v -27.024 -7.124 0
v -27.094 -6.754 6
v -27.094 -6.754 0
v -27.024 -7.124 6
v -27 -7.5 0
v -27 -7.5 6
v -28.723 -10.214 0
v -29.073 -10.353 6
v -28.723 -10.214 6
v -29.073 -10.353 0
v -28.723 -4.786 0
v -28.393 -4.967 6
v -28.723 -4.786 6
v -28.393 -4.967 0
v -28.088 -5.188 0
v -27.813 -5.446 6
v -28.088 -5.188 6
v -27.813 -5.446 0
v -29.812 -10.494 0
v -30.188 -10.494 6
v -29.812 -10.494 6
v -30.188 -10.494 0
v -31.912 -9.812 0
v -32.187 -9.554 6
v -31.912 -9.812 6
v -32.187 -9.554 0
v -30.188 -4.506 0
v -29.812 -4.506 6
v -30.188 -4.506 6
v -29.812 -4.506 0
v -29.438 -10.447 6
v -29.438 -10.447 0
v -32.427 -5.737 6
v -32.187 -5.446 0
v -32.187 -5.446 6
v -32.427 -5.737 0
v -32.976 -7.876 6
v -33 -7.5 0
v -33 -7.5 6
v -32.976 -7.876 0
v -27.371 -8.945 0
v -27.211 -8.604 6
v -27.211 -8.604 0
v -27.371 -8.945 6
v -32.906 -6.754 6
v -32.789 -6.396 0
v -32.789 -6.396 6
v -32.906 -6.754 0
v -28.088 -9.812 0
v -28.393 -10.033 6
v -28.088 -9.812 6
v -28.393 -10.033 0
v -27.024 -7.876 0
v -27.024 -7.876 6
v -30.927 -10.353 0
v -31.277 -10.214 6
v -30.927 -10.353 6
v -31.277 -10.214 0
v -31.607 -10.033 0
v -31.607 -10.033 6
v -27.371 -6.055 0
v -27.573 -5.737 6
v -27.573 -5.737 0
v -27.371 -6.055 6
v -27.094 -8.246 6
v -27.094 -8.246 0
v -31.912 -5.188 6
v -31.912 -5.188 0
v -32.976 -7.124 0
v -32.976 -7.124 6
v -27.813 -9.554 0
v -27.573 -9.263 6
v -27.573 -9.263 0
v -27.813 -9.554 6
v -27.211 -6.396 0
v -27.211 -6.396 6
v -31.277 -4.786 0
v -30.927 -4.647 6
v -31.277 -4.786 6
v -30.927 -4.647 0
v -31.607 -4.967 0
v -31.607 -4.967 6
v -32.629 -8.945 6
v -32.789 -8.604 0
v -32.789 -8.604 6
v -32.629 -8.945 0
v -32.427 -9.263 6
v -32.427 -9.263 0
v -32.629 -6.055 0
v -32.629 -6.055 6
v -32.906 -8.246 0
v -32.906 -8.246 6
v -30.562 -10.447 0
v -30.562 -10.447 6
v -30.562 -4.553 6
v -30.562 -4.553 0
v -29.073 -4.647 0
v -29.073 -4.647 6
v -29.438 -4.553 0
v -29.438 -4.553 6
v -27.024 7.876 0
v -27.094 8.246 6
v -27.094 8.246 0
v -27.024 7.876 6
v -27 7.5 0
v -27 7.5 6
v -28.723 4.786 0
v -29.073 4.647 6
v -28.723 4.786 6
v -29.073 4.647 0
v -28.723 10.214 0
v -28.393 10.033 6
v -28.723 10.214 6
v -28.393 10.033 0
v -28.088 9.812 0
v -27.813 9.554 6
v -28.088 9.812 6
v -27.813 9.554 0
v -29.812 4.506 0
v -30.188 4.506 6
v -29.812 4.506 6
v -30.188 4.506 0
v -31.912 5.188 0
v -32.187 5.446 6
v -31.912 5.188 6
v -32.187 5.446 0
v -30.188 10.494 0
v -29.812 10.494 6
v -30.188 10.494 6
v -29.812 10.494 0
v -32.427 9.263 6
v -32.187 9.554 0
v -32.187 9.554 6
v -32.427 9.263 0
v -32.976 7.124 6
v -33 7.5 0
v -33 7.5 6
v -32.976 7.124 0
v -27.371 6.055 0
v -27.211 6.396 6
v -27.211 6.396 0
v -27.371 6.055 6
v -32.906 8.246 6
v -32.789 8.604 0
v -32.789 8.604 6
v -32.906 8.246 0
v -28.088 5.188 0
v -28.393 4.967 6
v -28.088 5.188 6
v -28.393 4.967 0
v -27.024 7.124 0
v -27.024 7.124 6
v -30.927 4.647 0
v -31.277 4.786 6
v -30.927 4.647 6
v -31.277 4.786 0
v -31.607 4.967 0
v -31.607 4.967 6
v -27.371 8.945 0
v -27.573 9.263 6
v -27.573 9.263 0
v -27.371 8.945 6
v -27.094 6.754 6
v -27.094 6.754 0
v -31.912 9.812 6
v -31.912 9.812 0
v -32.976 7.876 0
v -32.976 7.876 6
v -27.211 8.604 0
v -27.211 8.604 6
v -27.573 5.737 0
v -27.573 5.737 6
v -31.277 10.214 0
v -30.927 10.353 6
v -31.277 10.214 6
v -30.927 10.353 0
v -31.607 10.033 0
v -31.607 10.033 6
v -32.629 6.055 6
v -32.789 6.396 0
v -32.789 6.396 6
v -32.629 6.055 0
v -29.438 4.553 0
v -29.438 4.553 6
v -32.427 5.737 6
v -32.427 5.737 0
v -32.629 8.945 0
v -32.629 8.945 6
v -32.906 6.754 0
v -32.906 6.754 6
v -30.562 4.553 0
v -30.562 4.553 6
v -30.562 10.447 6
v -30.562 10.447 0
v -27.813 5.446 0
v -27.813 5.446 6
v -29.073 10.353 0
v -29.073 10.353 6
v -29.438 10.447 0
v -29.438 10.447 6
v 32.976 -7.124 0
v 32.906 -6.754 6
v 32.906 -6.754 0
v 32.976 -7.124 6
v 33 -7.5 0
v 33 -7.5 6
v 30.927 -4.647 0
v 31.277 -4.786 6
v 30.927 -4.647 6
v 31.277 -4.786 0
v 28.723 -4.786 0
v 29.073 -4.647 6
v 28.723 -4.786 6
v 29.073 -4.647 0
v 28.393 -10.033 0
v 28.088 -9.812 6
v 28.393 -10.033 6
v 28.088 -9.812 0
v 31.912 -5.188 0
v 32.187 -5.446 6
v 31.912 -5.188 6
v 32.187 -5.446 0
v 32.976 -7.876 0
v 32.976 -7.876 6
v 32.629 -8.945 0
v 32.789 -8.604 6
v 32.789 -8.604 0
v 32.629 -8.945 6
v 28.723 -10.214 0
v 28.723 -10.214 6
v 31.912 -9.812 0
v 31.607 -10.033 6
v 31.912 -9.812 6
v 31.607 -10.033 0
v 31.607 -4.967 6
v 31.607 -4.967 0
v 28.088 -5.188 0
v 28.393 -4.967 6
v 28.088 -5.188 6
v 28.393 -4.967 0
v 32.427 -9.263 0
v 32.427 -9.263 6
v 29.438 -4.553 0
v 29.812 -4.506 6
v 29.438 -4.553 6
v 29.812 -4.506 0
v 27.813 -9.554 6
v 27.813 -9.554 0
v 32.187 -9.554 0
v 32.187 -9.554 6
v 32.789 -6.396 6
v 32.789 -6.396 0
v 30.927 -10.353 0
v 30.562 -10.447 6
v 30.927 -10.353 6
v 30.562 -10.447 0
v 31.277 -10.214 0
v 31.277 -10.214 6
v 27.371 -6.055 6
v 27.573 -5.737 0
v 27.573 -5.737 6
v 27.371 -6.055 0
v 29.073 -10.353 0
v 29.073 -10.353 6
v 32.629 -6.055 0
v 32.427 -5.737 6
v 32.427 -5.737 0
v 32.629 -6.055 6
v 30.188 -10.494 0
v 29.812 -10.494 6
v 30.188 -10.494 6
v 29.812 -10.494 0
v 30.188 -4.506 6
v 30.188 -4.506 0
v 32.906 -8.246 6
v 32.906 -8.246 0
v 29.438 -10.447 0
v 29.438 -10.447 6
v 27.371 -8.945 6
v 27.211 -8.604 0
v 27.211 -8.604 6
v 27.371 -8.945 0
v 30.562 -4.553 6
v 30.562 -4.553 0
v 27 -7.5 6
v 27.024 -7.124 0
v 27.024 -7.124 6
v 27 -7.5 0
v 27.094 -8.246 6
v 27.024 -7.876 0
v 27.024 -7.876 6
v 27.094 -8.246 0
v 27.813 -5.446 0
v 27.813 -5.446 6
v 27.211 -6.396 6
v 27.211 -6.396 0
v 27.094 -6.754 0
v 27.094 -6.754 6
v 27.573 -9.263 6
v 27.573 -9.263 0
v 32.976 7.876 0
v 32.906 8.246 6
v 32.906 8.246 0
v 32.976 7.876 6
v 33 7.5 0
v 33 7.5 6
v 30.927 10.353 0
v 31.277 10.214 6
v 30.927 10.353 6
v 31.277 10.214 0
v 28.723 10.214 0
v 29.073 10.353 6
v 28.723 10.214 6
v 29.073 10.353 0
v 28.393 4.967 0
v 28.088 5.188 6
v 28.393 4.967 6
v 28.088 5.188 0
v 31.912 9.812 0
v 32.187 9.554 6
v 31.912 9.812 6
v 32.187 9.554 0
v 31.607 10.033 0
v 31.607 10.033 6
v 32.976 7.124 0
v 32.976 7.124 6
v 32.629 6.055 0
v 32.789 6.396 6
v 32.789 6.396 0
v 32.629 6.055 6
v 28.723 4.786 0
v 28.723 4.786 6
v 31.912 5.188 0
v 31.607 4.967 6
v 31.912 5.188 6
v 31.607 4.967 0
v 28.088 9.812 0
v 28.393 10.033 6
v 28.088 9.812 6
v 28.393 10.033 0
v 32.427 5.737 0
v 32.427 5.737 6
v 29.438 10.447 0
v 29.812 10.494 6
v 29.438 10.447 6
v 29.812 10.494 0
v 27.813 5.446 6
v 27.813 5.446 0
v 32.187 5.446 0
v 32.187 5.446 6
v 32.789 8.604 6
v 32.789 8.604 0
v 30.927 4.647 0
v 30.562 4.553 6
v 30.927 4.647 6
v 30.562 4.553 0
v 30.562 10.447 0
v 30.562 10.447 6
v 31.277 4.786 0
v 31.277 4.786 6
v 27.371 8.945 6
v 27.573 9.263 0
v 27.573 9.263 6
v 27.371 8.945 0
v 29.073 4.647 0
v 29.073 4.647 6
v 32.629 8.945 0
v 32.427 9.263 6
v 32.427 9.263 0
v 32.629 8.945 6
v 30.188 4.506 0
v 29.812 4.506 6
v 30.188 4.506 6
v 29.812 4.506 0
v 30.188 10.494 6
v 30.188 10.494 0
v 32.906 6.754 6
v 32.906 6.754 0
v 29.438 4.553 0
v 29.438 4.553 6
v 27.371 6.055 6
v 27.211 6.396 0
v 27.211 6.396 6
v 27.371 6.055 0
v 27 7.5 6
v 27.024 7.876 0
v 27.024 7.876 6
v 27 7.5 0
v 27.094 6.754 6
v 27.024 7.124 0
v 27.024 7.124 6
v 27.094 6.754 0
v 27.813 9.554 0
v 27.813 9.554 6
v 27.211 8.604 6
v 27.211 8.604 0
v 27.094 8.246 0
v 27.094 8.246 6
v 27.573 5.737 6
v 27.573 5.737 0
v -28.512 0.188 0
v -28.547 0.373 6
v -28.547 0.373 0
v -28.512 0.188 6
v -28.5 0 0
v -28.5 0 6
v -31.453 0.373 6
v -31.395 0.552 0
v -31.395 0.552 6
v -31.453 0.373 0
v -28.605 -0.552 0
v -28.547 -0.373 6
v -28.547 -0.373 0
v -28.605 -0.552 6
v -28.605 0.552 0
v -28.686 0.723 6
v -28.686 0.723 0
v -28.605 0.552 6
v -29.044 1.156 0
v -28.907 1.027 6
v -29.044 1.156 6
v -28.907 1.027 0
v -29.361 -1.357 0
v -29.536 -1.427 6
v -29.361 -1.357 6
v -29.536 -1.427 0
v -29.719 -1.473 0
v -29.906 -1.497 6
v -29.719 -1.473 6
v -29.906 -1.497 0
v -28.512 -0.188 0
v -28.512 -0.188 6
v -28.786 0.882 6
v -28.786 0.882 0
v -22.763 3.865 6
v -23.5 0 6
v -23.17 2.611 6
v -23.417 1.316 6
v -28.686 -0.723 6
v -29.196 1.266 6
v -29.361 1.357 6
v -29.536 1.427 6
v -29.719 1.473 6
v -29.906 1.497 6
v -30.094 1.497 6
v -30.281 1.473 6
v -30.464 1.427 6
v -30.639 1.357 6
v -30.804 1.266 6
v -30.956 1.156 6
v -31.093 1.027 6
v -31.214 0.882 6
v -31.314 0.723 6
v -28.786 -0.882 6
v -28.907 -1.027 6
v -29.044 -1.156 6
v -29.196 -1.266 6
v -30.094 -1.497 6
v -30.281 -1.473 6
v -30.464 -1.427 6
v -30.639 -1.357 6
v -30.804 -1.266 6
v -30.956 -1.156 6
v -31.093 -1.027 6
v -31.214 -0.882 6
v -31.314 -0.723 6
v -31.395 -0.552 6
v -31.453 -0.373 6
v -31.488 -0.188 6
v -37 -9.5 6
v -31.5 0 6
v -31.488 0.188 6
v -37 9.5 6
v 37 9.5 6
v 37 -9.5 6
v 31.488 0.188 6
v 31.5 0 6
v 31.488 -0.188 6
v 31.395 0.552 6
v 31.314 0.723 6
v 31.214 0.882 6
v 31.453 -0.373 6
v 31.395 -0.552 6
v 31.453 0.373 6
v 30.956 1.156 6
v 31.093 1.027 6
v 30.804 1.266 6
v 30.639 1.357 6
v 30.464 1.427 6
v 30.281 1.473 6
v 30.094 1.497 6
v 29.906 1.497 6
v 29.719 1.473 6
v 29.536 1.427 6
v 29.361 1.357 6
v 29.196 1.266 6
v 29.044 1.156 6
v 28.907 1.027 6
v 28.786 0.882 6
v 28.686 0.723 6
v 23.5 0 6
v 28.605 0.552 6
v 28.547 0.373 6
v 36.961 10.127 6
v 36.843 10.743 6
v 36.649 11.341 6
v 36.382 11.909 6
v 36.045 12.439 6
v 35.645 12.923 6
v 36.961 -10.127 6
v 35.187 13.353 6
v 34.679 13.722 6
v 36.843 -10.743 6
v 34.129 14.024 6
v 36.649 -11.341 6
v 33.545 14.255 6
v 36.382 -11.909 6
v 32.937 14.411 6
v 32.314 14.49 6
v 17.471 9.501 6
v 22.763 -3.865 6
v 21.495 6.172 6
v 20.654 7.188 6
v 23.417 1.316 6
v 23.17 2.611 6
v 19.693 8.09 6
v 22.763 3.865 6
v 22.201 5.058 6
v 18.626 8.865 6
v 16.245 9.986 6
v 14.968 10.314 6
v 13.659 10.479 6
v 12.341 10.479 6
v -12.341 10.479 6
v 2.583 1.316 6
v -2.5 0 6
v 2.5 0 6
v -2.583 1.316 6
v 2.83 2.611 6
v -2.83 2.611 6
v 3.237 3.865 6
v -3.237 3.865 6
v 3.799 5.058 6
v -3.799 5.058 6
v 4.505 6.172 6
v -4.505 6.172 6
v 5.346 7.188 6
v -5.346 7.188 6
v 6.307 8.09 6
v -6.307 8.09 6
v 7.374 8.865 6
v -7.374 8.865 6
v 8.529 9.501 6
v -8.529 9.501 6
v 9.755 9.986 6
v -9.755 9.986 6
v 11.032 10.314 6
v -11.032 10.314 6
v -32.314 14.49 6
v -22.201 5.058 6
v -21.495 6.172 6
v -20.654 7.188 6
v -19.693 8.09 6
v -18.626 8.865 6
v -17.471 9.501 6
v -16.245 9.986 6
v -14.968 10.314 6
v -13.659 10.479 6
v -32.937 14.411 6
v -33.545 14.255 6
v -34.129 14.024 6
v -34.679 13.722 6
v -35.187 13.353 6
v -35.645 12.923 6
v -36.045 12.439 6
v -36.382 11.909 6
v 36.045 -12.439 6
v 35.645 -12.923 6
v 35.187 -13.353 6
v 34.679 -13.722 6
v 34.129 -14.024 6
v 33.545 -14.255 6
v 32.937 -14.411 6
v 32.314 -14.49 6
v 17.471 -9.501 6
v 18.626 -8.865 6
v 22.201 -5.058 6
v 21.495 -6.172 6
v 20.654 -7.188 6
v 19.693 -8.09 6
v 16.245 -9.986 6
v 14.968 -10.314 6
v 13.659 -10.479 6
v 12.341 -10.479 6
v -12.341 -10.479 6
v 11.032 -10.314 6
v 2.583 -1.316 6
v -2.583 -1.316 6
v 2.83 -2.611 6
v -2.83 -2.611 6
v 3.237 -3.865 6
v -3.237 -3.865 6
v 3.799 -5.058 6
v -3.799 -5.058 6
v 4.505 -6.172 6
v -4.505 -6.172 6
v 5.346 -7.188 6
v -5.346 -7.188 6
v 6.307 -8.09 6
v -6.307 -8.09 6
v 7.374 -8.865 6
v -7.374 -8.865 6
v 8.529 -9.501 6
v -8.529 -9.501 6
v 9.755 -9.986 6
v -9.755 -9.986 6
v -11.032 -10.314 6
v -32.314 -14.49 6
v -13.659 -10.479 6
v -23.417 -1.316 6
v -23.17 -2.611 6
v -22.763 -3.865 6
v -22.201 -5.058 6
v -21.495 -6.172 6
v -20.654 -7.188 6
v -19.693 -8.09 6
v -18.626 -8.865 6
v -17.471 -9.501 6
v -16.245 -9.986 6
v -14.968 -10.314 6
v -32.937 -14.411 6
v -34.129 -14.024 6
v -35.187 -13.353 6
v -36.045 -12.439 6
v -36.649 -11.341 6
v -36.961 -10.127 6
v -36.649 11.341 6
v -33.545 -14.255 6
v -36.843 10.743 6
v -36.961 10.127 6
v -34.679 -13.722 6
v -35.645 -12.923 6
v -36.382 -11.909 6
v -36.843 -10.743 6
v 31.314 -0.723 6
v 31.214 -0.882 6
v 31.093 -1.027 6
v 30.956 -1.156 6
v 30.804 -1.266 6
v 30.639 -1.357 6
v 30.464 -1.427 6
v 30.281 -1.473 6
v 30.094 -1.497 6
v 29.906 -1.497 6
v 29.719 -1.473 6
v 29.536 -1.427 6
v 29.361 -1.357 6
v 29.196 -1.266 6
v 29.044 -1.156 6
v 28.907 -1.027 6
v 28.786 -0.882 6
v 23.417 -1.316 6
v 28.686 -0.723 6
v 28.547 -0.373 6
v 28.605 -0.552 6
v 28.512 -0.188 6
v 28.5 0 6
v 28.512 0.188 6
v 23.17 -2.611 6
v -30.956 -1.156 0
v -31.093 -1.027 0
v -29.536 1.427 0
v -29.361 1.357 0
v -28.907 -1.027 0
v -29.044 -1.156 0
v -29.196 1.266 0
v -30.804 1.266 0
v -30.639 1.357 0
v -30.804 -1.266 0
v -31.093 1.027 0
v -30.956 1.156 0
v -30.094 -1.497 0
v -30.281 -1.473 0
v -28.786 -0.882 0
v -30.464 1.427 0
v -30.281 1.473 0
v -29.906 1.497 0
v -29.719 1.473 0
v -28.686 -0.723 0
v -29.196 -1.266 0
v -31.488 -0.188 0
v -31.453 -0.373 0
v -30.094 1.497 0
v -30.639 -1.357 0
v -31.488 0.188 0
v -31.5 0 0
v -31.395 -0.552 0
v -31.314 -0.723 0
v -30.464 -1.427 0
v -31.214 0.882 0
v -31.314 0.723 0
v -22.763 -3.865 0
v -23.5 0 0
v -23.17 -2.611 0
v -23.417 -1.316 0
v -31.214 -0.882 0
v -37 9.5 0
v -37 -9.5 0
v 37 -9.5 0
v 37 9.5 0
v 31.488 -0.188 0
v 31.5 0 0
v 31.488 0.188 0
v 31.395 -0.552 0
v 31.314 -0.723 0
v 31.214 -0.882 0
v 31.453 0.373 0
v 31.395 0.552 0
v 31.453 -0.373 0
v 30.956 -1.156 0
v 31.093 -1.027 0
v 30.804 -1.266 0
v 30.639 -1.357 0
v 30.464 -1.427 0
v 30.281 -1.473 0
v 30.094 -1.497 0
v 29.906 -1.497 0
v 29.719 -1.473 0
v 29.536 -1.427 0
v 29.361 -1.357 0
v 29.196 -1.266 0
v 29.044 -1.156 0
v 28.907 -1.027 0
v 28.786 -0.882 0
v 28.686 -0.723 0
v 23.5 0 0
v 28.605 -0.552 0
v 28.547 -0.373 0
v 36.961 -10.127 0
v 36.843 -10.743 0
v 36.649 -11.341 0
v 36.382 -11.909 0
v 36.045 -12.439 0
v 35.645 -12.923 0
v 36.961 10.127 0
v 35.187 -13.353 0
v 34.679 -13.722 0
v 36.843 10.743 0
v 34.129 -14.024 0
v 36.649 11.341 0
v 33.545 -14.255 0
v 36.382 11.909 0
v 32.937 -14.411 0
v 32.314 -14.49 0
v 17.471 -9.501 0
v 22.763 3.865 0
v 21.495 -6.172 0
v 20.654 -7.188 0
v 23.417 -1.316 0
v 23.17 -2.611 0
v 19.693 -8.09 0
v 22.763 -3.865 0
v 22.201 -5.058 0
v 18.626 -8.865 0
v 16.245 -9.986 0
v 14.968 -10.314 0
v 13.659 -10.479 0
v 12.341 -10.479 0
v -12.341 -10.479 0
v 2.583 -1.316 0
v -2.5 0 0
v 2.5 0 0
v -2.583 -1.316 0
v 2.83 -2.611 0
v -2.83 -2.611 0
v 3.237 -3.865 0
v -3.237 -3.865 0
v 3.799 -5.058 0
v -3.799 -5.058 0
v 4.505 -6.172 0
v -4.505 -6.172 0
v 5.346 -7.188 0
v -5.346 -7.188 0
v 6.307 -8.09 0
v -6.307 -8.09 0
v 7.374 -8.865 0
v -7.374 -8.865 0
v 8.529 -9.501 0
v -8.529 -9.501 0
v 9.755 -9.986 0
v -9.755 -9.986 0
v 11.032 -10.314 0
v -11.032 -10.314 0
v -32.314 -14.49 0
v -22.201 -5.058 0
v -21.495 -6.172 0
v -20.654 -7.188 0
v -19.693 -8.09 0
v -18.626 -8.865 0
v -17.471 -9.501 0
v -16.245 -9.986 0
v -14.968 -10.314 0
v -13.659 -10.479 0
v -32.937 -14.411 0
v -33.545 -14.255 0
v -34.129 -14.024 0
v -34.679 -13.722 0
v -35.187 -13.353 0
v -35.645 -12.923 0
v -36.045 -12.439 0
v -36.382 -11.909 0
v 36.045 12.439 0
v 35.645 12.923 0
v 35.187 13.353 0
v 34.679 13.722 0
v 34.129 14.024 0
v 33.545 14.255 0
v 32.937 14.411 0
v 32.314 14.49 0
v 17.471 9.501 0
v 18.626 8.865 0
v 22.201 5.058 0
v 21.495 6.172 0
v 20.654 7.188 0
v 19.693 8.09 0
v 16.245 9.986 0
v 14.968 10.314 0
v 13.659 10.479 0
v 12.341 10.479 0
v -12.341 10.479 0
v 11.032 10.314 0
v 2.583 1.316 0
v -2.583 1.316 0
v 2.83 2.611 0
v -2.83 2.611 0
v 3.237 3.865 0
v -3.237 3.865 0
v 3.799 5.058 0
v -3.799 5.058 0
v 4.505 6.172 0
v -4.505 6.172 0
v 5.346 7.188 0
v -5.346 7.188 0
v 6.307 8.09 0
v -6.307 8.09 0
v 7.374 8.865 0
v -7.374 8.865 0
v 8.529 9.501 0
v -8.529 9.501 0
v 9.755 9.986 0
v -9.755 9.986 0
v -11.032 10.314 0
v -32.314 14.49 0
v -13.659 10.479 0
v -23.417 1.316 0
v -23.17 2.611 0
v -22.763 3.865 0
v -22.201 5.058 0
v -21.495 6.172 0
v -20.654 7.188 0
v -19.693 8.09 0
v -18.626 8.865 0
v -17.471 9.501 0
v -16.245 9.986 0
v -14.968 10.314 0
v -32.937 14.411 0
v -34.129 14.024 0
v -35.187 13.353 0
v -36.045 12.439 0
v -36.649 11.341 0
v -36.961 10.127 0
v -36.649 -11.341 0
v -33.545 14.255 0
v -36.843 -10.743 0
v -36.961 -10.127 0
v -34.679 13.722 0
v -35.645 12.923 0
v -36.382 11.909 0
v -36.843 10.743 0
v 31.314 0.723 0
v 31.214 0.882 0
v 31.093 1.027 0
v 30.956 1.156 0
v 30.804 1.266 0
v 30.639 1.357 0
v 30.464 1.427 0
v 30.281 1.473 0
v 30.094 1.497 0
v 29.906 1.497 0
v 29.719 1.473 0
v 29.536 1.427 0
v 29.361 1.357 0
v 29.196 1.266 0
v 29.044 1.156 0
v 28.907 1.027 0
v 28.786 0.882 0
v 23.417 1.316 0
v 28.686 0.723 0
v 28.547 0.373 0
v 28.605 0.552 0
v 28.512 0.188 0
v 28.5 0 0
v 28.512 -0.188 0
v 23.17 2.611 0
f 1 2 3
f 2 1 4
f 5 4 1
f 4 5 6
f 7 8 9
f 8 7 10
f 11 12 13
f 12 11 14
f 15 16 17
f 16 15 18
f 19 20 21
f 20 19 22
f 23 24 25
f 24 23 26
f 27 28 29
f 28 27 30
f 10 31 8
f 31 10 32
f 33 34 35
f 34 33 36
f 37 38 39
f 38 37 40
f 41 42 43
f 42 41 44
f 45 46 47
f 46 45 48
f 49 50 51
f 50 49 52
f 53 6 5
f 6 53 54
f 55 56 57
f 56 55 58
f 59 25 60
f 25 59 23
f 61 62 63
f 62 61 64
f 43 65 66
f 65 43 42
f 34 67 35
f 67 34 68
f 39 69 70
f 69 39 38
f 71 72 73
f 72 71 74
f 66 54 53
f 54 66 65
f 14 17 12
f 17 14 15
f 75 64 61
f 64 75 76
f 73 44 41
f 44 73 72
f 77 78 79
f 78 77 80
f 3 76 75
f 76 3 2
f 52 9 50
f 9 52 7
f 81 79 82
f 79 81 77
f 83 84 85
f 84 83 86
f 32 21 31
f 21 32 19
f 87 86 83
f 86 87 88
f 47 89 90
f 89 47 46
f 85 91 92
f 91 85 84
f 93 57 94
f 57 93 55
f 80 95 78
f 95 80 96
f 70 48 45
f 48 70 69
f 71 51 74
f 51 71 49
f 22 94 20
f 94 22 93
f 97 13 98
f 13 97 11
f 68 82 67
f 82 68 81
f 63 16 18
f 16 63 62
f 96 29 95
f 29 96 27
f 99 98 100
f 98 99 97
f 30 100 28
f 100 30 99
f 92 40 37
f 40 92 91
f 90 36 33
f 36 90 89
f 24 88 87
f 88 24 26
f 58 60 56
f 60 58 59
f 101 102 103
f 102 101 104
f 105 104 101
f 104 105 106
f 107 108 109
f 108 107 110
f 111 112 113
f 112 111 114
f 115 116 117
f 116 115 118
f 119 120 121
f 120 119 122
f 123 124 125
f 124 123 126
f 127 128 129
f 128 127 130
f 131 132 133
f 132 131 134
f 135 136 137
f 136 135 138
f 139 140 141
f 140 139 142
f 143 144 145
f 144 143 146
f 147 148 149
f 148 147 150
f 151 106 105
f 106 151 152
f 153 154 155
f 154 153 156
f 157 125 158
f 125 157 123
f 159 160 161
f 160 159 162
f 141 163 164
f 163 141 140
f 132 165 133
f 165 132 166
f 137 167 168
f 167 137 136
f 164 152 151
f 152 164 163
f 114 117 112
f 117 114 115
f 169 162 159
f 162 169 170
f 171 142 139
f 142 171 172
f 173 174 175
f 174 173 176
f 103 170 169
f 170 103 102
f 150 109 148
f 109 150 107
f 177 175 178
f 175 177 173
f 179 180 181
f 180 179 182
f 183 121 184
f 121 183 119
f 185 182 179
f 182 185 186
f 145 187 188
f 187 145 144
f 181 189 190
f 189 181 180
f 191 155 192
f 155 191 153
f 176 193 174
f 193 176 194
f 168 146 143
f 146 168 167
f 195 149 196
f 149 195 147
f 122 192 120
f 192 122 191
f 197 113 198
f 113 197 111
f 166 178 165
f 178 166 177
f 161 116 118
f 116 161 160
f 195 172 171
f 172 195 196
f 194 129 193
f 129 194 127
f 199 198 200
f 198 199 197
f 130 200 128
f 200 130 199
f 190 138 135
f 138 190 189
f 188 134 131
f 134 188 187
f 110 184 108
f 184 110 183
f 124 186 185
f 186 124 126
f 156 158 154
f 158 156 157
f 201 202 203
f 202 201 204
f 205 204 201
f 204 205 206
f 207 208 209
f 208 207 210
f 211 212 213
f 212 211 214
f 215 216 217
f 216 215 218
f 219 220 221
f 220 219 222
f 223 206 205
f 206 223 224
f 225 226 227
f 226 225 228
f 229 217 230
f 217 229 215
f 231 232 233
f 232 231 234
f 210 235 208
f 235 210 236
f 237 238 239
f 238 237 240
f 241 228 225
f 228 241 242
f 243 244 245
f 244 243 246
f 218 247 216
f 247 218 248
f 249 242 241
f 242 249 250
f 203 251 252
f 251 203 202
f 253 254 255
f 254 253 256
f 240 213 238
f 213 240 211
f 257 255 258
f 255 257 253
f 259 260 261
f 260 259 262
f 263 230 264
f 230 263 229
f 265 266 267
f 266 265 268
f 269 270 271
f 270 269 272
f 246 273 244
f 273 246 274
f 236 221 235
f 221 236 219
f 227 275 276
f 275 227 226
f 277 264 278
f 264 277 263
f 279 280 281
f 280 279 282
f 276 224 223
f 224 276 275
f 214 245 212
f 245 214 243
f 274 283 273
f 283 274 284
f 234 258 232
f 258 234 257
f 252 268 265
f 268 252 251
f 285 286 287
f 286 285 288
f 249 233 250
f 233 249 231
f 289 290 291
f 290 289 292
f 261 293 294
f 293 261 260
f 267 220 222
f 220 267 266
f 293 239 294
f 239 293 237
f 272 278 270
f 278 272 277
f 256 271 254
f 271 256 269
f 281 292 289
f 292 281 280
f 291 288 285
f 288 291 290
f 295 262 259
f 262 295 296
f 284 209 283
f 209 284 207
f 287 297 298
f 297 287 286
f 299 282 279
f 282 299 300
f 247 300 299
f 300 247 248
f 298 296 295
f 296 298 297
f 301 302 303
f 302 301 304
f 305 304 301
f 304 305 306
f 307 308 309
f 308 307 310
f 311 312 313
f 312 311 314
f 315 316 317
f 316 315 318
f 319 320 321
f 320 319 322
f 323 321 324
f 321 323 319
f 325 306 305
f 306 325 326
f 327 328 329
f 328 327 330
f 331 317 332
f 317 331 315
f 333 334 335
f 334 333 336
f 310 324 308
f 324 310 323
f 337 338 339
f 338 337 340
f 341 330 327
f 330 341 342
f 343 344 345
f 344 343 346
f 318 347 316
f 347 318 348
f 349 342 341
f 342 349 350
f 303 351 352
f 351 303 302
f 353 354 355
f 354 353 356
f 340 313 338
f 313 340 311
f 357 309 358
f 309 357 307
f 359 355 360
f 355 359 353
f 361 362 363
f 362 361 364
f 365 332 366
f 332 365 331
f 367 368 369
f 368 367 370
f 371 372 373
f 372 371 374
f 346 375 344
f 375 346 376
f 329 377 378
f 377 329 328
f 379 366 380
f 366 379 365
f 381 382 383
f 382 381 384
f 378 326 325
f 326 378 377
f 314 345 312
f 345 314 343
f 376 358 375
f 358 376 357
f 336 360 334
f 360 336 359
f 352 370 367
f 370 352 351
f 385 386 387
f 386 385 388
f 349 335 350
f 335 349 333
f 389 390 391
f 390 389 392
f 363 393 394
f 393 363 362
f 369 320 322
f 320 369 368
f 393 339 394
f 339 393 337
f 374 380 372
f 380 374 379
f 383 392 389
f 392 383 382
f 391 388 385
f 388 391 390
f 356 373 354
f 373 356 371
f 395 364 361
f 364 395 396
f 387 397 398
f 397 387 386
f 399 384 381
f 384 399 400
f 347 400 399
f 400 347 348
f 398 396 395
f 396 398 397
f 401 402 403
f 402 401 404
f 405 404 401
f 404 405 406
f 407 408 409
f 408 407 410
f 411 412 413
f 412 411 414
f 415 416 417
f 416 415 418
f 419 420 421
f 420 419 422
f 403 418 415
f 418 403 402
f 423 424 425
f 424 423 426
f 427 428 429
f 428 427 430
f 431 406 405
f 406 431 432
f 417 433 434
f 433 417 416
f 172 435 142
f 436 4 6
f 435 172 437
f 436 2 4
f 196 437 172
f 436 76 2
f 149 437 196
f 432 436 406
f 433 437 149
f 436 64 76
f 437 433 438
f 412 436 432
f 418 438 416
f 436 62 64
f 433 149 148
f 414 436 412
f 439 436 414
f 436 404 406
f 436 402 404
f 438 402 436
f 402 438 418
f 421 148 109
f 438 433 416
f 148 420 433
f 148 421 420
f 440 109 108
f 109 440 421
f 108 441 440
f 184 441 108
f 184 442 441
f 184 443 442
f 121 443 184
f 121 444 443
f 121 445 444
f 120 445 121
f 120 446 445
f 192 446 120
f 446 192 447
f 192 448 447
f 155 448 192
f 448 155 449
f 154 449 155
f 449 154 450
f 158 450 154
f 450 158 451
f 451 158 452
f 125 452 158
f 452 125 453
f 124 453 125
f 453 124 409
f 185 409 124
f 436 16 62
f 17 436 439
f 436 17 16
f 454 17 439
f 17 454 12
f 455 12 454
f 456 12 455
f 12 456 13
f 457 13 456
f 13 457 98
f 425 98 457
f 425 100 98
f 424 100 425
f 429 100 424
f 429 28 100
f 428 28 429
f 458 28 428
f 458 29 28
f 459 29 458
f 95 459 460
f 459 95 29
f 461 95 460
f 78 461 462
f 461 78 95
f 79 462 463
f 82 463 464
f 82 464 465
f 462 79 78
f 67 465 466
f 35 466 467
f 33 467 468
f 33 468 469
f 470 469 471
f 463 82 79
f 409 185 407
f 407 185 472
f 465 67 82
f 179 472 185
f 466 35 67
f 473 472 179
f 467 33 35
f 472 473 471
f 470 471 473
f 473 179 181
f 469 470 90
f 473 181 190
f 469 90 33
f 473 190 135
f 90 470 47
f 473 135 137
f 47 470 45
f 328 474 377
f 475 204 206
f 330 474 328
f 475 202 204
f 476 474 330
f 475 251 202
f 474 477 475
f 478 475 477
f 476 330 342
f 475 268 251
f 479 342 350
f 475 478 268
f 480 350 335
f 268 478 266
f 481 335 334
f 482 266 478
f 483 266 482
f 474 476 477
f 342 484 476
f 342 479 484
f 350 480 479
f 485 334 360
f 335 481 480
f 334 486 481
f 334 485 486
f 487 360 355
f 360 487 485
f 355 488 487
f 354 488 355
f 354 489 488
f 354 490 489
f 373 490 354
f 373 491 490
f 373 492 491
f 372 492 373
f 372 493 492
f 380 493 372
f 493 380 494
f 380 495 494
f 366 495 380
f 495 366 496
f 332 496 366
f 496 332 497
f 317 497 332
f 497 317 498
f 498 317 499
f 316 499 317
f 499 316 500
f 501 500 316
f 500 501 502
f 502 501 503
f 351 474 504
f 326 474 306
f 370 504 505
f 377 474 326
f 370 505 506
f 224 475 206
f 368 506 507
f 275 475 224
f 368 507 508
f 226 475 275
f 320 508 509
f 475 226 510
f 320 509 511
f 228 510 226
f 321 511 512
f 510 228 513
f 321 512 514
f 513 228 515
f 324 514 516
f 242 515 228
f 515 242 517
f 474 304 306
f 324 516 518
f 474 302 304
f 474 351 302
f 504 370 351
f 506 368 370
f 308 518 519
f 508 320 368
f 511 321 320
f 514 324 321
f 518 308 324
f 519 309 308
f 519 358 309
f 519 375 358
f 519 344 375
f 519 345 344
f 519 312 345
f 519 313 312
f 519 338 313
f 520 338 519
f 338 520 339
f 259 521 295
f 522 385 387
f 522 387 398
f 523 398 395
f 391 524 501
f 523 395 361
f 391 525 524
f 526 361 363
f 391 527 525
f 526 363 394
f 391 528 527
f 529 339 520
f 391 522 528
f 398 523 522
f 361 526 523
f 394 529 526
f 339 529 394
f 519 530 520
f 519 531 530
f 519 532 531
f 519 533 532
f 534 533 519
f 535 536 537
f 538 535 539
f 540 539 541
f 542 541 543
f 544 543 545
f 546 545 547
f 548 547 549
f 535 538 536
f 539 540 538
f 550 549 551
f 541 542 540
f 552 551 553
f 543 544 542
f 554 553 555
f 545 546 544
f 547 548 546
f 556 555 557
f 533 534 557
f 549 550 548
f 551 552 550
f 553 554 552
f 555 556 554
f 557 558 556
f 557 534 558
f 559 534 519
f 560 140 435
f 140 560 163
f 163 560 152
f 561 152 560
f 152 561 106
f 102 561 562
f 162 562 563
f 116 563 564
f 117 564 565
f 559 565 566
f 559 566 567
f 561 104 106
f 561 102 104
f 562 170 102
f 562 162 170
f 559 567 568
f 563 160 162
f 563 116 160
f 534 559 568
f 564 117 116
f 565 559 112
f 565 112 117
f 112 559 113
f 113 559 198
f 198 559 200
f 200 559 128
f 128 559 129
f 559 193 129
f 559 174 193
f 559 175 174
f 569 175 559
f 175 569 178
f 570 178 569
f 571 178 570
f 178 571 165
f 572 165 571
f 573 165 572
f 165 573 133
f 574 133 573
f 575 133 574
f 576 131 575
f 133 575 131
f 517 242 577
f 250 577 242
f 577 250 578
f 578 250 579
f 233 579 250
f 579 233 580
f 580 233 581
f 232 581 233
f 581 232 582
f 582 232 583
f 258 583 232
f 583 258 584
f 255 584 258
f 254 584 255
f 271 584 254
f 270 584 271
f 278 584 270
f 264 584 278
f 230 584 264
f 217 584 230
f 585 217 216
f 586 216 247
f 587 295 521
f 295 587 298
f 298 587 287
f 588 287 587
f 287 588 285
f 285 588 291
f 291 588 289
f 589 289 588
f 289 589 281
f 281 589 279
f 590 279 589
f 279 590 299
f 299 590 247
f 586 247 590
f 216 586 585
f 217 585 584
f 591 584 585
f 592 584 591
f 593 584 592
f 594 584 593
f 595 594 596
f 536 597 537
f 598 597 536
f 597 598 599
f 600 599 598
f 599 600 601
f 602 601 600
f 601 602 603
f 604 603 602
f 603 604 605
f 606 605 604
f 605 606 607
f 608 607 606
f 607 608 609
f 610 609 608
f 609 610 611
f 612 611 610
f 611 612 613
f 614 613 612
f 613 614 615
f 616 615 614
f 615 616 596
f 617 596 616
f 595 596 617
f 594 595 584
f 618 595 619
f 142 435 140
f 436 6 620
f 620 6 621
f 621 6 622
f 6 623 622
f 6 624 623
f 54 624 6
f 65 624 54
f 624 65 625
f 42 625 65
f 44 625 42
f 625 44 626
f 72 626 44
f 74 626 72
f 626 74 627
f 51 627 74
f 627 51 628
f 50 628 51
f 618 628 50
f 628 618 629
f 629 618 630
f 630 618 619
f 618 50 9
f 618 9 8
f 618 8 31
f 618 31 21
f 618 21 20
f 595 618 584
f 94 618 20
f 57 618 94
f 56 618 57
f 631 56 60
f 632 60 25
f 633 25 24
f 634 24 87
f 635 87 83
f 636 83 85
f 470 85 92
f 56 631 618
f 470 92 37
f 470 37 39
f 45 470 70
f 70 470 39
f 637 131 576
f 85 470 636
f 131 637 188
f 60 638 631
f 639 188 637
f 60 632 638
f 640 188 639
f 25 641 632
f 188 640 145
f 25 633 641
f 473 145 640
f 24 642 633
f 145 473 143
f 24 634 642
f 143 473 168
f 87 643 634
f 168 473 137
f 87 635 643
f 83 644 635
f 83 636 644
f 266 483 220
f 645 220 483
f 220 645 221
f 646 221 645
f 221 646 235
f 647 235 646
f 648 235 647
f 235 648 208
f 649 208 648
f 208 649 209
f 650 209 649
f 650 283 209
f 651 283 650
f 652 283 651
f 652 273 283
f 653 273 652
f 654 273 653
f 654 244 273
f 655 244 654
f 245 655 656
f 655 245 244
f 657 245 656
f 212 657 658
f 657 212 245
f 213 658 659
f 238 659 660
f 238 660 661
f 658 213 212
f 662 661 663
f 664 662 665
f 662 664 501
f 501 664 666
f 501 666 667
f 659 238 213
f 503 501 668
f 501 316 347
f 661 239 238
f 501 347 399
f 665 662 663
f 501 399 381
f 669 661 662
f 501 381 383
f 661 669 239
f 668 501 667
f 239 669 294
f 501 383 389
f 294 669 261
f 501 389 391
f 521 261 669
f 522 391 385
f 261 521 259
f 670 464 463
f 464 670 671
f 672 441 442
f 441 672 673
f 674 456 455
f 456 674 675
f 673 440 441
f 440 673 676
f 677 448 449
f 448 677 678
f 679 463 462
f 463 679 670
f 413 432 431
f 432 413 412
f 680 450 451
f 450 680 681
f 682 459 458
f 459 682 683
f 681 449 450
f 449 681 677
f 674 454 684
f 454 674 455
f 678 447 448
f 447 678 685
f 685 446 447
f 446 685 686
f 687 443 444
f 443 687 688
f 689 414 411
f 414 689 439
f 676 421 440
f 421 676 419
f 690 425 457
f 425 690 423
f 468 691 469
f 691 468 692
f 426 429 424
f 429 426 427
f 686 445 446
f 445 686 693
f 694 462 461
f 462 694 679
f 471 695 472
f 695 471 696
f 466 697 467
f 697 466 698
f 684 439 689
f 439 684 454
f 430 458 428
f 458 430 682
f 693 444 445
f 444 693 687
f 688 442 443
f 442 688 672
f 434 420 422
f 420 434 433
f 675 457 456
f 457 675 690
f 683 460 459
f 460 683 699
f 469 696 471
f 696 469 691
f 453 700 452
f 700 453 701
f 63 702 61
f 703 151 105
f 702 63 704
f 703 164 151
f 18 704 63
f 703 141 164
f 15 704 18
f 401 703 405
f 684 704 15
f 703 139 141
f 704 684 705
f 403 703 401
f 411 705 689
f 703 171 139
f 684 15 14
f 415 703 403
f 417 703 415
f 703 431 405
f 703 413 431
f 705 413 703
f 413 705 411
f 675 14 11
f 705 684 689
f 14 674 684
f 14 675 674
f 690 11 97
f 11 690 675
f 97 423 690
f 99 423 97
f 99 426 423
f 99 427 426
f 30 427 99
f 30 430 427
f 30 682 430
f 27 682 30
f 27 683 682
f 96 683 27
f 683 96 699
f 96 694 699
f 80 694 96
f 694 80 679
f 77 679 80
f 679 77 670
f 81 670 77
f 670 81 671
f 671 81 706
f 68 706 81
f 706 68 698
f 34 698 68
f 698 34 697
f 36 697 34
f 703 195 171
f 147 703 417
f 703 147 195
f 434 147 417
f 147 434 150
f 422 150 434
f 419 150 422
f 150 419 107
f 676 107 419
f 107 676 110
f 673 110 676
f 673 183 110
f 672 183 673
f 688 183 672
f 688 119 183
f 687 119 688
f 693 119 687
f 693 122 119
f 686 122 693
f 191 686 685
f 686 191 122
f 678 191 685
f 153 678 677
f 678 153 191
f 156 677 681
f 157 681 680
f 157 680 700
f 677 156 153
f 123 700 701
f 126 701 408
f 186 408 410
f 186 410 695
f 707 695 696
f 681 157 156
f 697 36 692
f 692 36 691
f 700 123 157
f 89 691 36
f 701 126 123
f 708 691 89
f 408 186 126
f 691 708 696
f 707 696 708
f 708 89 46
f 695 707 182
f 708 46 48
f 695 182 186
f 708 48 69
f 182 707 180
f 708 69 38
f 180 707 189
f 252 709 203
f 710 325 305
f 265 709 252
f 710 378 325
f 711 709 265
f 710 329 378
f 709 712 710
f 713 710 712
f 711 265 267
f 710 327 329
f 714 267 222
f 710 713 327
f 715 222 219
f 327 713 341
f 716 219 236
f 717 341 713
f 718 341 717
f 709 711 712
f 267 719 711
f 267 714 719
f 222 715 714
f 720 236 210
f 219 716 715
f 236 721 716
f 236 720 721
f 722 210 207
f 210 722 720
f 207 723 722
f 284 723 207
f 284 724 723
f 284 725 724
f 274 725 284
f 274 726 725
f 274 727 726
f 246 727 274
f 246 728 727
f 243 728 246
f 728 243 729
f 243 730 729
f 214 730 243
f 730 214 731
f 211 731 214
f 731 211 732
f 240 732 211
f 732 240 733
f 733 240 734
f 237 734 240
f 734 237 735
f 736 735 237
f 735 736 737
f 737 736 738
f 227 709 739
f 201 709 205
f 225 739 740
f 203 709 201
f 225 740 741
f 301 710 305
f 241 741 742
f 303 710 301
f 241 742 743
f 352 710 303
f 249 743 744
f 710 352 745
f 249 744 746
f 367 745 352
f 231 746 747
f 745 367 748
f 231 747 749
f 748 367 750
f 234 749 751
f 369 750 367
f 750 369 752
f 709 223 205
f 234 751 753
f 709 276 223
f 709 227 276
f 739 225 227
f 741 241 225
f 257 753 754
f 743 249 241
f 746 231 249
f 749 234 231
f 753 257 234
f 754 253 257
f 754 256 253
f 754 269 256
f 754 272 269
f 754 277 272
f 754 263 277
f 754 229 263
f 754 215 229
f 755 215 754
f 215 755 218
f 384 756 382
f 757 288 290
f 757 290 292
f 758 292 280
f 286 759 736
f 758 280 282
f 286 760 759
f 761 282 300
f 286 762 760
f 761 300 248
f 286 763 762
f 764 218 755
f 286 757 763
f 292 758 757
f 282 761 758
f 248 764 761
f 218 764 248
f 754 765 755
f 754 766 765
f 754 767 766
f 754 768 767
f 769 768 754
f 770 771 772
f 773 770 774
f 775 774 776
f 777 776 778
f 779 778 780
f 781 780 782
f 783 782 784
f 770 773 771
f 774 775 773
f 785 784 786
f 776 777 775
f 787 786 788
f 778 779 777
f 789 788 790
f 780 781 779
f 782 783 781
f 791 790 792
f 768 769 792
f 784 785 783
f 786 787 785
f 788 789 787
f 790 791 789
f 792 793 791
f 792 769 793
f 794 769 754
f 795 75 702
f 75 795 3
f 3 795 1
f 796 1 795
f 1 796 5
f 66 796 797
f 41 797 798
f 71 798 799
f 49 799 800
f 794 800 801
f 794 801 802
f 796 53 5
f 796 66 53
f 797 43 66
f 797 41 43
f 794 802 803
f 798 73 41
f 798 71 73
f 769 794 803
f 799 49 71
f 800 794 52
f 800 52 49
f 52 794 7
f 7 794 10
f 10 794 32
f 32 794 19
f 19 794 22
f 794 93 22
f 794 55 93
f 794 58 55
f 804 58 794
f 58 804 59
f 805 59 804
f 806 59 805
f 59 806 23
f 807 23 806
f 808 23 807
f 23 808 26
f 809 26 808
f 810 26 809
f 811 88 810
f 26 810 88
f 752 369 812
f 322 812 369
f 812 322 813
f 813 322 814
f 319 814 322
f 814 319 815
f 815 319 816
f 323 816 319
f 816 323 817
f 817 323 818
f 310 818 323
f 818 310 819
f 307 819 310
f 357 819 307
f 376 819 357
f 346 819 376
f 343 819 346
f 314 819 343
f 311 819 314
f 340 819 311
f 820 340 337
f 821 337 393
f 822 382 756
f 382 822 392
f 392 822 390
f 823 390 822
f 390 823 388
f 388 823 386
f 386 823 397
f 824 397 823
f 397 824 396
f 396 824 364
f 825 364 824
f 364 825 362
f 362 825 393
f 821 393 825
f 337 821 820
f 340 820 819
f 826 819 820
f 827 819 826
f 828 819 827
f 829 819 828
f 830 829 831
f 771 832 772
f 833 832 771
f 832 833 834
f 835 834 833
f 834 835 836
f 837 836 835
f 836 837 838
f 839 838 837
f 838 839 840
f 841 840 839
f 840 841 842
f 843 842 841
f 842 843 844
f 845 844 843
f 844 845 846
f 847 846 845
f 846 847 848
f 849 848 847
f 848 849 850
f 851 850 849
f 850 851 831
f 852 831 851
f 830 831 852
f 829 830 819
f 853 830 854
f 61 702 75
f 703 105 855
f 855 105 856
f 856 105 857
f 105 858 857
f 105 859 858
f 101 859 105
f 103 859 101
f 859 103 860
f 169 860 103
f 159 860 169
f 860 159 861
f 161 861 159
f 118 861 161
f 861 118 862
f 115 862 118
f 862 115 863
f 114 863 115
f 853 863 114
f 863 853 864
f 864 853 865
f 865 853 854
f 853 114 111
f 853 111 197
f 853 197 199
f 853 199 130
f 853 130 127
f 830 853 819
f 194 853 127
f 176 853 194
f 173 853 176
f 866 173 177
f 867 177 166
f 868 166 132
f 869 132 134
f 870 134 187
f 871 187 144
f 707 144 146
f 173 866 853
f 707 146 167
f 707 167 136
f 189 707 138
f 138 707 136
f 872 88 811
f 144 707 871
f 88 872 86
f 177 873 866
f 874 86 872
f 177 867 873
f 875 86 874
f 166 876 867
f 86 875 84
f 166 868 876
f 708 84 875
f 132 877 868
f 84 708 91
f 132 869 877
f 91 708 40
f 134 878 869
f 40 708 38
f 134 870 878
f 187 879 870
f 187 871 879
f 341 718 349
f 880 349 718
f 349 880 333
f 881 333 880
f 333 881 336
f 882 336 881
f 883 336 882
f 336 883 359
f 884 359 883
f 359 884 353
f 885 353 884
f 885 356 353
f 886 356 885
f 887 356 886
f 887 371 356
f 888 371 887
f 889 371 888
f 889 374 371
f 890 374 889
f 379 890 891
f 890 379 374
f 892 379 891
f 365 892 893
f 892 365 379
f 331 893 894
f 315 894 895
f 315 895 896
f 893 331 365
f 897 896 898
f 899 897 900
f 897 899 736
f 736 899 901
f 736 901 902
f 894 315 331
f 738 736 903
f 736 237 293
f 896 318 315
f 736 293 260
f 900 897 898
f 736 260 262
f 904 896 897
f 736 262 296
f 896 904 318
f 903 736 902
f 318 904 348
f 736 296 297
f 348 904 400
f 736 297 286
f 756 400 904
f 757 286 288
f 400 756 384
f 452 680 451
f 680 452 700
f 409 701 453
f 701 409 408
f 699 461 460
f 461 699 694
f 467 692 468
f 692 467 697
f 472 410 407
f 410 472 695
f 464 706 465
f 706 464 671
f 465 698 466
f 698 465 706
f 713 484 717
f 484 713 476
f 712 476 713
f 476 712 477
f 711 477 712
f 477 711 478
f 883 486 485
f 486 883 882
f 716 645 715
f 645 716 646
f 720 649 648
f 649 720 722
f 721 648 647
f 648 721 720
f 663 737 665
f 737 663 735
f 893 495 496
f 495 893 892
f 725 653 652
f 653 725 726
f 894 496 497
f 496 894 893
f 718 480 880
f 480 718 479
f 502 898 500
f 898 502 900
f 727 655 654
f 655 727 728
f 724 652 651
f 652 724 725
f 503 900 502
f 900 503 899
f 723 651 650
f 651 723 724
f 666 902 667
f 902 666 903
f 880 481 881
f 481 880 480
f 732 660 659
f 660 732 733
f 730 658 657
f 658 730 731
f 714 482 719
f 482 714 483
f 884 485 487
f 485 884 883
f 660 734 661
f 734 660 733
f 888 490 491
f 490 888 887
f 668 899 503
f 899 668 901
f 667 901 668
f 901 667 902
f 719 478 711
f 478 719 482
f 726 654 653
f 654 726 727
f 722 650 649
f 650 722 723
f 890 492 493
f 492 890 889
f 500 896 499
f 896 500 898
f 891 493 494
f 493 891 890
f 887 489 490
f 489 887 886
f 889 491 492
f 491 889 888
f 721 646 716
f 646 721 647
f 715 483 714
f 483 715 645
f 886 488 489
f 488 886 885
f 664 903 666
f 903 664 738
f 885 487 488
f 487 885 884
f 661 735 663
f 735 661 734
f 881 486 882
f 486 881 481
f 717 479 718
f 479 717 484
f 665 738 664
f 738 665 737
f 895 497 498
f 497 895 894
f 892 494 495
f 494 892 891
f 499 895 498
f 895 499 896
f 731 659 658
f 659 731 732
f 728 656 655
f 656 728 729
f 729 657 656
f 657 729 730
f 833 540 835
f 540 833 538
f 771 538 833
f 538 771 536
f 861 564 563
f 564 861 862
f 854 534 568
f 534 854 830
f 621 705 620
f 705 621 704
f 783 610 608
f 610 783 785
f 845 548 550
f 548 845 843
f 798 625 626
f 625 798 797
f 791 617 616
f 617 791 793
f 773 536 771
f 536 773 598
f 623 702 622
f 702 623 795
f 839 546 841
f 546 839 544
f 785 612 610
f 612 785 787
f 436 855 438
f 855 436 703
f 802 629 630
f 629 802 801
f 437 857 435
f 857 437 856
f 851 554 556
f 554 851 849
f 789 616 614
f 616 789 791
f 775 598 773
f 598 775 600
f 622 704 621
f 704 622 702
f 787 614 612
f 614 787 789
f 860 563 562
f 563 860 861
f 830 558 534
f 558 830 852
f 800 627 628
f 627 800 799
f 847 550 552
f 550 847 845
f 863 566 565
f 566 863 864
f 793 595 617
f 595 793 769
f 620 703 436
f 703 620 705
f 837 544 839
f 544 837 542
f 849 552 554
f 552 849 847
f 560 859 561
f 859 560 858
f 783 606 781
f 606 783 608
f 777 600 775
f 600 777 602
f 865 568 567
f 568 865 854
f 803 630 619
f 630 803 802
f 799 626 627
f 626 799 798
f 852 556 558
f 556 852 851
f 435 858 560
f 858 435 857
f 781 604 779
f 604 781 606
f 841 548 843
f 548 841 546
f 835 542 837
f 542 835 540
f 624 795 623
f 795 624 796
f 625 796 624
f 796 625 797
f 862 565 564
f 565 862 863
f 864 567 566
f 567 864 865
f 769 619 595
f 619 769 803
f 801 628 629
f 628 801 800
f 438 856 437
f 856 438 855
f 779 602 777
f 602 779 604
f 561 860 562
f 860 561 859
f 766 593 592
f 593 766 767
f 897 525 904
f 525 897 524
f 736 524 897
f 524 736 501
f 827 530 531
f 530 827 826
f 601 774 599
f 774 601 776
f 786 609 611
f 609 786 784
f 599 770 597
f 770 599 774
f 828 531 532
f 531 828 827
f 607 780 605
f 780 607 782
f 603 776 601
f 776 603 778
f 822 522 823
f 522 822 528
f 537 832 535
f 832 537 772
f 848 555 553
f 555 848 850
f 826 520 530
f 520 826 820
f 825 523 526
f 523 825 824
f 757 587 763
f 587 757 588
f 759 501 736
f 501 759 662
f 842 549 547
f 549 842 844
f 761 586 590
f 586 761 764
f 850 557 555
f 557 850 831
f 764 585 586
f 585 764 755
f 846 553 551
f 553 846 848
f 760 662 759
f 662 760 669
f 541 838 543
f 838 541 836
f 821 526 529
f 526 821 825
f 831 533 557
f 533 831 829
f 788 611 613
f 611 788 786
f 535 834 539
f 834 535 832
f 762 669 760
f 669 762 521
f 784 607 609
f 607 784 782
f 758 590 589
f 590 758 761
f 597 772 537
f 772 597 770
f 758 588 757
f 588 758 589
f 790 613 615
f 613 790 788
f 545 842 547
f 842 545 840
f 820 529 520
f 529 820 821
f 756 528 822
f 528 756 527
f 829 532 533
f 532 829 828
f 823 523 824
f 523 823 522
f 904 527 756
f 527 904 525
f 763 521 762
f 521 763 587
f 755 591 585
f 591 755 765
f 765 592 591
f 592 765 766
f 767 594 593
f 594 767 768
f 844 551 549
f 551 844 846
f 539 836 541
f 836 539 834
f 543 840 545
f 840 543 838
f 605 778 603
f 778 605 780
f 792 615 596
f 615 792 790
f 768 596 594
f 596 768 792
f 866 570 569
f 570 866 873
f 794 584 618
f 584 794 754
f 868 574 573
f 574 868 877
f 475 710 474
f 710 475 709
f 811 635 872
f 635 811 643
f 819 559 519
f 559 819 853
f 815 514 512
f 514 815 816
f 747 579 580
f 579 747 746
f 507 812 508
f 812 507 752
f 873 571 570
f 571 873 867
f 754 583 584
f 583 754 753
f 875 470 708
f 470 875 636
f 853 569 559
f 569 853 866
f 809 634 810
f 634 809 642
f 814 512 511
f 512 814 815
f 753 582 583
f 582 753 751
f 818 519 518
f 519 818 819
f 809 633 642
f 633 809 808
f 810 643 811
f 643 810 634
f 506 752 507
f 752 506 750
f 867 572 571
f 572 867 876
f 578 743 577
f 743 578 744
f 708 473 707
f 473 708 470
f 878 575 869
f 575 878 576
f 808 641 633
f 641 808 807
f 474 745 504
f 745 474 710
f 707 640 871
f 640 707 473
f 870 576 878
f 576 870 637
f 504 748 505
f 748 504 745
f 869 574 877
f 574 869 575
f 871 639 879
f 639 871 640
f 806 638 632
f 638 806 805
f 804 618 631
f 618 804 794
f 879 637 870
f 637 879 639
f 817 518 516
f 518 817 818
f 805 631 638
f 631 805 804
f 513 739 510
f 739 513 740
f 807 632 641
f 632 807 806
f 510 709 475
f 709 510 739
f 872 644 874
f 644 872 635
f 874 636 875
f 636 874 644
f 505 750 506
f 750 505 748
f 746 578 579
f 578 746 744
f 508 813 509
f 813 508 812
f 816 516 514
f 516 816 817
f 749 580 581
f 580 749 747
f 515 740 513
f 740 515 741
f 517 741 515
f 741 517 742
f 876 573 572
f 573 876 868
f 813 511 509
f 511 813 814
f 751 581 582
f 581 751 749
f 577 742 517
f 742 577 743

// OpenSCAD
$fn = 50;


difference() {
	union() {
		hull() {
			translate(v = [-32.0000000000, 9.5000000000, 0]) {
				cylinder(h = 6, r = 5);
			}
			translate(v = [32.0000000000, 9.5000000000, 0]) {
				cylinder(h = 6, r = 5);
			}
			translate(v = [-32.0000000000, -9.5000000000, 0]) {
				cylinder(h = 6, r = 5);
			}
			translate(v = [32.0000000000, -9.5000000000, 0]) {
				cylinder(h = 6, r = 5);
			}
		}
	}
	union() {
		#translate(v = [-30.0000000000, -7.5000000000, 0]) {
			cylinder(h = 6, r = 3.0000000000);
		}
		#translate(v = [-30.0000000000, 7.5000000000, 0]) {
			cylinder(h = 6, r = 3.0000000000);
		}
		#translate(v = [30.0000000000, -7.5000000000, 0]) {
			cylinder(h = 6, r = 3.0000000000);
		}
		#translate(v = [30.0000000000, 7.5000000000, 0]) {
			cylinder(h = 6, r = 3.0000000000);
		}
		#translate(v = [-30.0000000000, -7.5000000000, -100.0000000000]) {
			cylinder(h = 200, r = 3.0000000000);
		}
		#translate(v = [-30.0000000000, 7.5000000000, -100.0000000000]) {
			cylinder(h = 200, r = 3.0000000000);
		}
		#translate(v = [30.0000000000, -7.5000000000, -100.0000000000]) {
			cylinder(h = 200, r = 3.0000000000);
		}
		#translate(v = [30.0000000000, 7.5000000000, -100.0000000000]) {
			cylinder(h = 200, r = 3.0000000000);
		}
		#translate(v = [-30.0000000000, -7.5000000000, 0]) {
			cylinder(h = 6, r = 1.5000000000);
		}
		#translate(v = [-30.0000000000, 0.0000000000, 0]) {
			cylinder(h = 6, r = 1.5000000000);
		}
		#translate(v = [-30.0000000000, 7.5000000000, 0]) {
			cylinder(h = 6, r = 1.5000000000);
		}
		#translate(v = [30.0000000000, -7.5000000000, 0]) {
			cylinder(h = 6, r = 1.5000000000);
		}
		#translate(v = [30.0000000000, 0.0000000000, 0]) {
			cylinder(h = 6, r = 1.5000000000);
		}
		#translate(v = [30.0000000000, 7.5000000000, 0]) {
			cylinder(h = 6, r = 1.5000000000);
		}
		#translate(v = [-30.0000000000, -7.5000000000, 0]) {
			cylinder(h = 6, r = 1.5000000000);
		}
		#translate(v = [-30.0000000000, 0.0000000000, 0]) {
			cylinder(h = 6, r = 1.5000000000);
		}
		#translate(v = [-30.0000000000, 7.5000000000, 0]) {
			cylinder(h = 6, r = 1.5000000000);
		}
		#translate(v = [30.0000000000, -7.5000000000, 0]) {
			cylinder(h = 6, r = 1.5000000000);
		}
		#translate(v = [30.0000000000, 0.0000000000, 0]) {
			cylinder(h = 6, r = 1.5000000000);
		}
		#translate(v = [30.0000000000, 7.5000000000, 0]) {
			cylinder(h = 6, r = 1.5000000000);
		}
		#translate(v = [-30.0000000000, -7.5000000000, 0]) {
			cylinder(h = 6, r = 1.5000000000);
		}
		#translate(v = [-30.0000000000, 0.0000000000, 0]) {
			cylinder(h = 6, r = 1.5000000000);
		}
		#translate(v = [-30.0000000000, 7.5000000000, 0]) {
			cylinder(h = 6, r = 1.5000000000);
		}
		#translate(v = [30.0000000000, -7.5000000000, 0]) {
			cylinder(h = 6, r = 1.5000000000);
		}
		#translate(v = [30.0000000000, 0.0000000000, 0]) {
			cylinder(h = 6, r = 1.5000000000);
		}
		#translate(v = [30.0000000000, 7.5000000000, 0]) {
			cylinder(h = 6, r = 1.5000000000);
		}
		#translate(v = [-13.0000000000, 0, 0]) {
			cylinder(h = 6, r = 10.5000000000);
		}
		#translate(v = [13.0000000000, 0, 0]) {
			cylinder(h = 6, r = 10.5000000000);
		}
	}
}
